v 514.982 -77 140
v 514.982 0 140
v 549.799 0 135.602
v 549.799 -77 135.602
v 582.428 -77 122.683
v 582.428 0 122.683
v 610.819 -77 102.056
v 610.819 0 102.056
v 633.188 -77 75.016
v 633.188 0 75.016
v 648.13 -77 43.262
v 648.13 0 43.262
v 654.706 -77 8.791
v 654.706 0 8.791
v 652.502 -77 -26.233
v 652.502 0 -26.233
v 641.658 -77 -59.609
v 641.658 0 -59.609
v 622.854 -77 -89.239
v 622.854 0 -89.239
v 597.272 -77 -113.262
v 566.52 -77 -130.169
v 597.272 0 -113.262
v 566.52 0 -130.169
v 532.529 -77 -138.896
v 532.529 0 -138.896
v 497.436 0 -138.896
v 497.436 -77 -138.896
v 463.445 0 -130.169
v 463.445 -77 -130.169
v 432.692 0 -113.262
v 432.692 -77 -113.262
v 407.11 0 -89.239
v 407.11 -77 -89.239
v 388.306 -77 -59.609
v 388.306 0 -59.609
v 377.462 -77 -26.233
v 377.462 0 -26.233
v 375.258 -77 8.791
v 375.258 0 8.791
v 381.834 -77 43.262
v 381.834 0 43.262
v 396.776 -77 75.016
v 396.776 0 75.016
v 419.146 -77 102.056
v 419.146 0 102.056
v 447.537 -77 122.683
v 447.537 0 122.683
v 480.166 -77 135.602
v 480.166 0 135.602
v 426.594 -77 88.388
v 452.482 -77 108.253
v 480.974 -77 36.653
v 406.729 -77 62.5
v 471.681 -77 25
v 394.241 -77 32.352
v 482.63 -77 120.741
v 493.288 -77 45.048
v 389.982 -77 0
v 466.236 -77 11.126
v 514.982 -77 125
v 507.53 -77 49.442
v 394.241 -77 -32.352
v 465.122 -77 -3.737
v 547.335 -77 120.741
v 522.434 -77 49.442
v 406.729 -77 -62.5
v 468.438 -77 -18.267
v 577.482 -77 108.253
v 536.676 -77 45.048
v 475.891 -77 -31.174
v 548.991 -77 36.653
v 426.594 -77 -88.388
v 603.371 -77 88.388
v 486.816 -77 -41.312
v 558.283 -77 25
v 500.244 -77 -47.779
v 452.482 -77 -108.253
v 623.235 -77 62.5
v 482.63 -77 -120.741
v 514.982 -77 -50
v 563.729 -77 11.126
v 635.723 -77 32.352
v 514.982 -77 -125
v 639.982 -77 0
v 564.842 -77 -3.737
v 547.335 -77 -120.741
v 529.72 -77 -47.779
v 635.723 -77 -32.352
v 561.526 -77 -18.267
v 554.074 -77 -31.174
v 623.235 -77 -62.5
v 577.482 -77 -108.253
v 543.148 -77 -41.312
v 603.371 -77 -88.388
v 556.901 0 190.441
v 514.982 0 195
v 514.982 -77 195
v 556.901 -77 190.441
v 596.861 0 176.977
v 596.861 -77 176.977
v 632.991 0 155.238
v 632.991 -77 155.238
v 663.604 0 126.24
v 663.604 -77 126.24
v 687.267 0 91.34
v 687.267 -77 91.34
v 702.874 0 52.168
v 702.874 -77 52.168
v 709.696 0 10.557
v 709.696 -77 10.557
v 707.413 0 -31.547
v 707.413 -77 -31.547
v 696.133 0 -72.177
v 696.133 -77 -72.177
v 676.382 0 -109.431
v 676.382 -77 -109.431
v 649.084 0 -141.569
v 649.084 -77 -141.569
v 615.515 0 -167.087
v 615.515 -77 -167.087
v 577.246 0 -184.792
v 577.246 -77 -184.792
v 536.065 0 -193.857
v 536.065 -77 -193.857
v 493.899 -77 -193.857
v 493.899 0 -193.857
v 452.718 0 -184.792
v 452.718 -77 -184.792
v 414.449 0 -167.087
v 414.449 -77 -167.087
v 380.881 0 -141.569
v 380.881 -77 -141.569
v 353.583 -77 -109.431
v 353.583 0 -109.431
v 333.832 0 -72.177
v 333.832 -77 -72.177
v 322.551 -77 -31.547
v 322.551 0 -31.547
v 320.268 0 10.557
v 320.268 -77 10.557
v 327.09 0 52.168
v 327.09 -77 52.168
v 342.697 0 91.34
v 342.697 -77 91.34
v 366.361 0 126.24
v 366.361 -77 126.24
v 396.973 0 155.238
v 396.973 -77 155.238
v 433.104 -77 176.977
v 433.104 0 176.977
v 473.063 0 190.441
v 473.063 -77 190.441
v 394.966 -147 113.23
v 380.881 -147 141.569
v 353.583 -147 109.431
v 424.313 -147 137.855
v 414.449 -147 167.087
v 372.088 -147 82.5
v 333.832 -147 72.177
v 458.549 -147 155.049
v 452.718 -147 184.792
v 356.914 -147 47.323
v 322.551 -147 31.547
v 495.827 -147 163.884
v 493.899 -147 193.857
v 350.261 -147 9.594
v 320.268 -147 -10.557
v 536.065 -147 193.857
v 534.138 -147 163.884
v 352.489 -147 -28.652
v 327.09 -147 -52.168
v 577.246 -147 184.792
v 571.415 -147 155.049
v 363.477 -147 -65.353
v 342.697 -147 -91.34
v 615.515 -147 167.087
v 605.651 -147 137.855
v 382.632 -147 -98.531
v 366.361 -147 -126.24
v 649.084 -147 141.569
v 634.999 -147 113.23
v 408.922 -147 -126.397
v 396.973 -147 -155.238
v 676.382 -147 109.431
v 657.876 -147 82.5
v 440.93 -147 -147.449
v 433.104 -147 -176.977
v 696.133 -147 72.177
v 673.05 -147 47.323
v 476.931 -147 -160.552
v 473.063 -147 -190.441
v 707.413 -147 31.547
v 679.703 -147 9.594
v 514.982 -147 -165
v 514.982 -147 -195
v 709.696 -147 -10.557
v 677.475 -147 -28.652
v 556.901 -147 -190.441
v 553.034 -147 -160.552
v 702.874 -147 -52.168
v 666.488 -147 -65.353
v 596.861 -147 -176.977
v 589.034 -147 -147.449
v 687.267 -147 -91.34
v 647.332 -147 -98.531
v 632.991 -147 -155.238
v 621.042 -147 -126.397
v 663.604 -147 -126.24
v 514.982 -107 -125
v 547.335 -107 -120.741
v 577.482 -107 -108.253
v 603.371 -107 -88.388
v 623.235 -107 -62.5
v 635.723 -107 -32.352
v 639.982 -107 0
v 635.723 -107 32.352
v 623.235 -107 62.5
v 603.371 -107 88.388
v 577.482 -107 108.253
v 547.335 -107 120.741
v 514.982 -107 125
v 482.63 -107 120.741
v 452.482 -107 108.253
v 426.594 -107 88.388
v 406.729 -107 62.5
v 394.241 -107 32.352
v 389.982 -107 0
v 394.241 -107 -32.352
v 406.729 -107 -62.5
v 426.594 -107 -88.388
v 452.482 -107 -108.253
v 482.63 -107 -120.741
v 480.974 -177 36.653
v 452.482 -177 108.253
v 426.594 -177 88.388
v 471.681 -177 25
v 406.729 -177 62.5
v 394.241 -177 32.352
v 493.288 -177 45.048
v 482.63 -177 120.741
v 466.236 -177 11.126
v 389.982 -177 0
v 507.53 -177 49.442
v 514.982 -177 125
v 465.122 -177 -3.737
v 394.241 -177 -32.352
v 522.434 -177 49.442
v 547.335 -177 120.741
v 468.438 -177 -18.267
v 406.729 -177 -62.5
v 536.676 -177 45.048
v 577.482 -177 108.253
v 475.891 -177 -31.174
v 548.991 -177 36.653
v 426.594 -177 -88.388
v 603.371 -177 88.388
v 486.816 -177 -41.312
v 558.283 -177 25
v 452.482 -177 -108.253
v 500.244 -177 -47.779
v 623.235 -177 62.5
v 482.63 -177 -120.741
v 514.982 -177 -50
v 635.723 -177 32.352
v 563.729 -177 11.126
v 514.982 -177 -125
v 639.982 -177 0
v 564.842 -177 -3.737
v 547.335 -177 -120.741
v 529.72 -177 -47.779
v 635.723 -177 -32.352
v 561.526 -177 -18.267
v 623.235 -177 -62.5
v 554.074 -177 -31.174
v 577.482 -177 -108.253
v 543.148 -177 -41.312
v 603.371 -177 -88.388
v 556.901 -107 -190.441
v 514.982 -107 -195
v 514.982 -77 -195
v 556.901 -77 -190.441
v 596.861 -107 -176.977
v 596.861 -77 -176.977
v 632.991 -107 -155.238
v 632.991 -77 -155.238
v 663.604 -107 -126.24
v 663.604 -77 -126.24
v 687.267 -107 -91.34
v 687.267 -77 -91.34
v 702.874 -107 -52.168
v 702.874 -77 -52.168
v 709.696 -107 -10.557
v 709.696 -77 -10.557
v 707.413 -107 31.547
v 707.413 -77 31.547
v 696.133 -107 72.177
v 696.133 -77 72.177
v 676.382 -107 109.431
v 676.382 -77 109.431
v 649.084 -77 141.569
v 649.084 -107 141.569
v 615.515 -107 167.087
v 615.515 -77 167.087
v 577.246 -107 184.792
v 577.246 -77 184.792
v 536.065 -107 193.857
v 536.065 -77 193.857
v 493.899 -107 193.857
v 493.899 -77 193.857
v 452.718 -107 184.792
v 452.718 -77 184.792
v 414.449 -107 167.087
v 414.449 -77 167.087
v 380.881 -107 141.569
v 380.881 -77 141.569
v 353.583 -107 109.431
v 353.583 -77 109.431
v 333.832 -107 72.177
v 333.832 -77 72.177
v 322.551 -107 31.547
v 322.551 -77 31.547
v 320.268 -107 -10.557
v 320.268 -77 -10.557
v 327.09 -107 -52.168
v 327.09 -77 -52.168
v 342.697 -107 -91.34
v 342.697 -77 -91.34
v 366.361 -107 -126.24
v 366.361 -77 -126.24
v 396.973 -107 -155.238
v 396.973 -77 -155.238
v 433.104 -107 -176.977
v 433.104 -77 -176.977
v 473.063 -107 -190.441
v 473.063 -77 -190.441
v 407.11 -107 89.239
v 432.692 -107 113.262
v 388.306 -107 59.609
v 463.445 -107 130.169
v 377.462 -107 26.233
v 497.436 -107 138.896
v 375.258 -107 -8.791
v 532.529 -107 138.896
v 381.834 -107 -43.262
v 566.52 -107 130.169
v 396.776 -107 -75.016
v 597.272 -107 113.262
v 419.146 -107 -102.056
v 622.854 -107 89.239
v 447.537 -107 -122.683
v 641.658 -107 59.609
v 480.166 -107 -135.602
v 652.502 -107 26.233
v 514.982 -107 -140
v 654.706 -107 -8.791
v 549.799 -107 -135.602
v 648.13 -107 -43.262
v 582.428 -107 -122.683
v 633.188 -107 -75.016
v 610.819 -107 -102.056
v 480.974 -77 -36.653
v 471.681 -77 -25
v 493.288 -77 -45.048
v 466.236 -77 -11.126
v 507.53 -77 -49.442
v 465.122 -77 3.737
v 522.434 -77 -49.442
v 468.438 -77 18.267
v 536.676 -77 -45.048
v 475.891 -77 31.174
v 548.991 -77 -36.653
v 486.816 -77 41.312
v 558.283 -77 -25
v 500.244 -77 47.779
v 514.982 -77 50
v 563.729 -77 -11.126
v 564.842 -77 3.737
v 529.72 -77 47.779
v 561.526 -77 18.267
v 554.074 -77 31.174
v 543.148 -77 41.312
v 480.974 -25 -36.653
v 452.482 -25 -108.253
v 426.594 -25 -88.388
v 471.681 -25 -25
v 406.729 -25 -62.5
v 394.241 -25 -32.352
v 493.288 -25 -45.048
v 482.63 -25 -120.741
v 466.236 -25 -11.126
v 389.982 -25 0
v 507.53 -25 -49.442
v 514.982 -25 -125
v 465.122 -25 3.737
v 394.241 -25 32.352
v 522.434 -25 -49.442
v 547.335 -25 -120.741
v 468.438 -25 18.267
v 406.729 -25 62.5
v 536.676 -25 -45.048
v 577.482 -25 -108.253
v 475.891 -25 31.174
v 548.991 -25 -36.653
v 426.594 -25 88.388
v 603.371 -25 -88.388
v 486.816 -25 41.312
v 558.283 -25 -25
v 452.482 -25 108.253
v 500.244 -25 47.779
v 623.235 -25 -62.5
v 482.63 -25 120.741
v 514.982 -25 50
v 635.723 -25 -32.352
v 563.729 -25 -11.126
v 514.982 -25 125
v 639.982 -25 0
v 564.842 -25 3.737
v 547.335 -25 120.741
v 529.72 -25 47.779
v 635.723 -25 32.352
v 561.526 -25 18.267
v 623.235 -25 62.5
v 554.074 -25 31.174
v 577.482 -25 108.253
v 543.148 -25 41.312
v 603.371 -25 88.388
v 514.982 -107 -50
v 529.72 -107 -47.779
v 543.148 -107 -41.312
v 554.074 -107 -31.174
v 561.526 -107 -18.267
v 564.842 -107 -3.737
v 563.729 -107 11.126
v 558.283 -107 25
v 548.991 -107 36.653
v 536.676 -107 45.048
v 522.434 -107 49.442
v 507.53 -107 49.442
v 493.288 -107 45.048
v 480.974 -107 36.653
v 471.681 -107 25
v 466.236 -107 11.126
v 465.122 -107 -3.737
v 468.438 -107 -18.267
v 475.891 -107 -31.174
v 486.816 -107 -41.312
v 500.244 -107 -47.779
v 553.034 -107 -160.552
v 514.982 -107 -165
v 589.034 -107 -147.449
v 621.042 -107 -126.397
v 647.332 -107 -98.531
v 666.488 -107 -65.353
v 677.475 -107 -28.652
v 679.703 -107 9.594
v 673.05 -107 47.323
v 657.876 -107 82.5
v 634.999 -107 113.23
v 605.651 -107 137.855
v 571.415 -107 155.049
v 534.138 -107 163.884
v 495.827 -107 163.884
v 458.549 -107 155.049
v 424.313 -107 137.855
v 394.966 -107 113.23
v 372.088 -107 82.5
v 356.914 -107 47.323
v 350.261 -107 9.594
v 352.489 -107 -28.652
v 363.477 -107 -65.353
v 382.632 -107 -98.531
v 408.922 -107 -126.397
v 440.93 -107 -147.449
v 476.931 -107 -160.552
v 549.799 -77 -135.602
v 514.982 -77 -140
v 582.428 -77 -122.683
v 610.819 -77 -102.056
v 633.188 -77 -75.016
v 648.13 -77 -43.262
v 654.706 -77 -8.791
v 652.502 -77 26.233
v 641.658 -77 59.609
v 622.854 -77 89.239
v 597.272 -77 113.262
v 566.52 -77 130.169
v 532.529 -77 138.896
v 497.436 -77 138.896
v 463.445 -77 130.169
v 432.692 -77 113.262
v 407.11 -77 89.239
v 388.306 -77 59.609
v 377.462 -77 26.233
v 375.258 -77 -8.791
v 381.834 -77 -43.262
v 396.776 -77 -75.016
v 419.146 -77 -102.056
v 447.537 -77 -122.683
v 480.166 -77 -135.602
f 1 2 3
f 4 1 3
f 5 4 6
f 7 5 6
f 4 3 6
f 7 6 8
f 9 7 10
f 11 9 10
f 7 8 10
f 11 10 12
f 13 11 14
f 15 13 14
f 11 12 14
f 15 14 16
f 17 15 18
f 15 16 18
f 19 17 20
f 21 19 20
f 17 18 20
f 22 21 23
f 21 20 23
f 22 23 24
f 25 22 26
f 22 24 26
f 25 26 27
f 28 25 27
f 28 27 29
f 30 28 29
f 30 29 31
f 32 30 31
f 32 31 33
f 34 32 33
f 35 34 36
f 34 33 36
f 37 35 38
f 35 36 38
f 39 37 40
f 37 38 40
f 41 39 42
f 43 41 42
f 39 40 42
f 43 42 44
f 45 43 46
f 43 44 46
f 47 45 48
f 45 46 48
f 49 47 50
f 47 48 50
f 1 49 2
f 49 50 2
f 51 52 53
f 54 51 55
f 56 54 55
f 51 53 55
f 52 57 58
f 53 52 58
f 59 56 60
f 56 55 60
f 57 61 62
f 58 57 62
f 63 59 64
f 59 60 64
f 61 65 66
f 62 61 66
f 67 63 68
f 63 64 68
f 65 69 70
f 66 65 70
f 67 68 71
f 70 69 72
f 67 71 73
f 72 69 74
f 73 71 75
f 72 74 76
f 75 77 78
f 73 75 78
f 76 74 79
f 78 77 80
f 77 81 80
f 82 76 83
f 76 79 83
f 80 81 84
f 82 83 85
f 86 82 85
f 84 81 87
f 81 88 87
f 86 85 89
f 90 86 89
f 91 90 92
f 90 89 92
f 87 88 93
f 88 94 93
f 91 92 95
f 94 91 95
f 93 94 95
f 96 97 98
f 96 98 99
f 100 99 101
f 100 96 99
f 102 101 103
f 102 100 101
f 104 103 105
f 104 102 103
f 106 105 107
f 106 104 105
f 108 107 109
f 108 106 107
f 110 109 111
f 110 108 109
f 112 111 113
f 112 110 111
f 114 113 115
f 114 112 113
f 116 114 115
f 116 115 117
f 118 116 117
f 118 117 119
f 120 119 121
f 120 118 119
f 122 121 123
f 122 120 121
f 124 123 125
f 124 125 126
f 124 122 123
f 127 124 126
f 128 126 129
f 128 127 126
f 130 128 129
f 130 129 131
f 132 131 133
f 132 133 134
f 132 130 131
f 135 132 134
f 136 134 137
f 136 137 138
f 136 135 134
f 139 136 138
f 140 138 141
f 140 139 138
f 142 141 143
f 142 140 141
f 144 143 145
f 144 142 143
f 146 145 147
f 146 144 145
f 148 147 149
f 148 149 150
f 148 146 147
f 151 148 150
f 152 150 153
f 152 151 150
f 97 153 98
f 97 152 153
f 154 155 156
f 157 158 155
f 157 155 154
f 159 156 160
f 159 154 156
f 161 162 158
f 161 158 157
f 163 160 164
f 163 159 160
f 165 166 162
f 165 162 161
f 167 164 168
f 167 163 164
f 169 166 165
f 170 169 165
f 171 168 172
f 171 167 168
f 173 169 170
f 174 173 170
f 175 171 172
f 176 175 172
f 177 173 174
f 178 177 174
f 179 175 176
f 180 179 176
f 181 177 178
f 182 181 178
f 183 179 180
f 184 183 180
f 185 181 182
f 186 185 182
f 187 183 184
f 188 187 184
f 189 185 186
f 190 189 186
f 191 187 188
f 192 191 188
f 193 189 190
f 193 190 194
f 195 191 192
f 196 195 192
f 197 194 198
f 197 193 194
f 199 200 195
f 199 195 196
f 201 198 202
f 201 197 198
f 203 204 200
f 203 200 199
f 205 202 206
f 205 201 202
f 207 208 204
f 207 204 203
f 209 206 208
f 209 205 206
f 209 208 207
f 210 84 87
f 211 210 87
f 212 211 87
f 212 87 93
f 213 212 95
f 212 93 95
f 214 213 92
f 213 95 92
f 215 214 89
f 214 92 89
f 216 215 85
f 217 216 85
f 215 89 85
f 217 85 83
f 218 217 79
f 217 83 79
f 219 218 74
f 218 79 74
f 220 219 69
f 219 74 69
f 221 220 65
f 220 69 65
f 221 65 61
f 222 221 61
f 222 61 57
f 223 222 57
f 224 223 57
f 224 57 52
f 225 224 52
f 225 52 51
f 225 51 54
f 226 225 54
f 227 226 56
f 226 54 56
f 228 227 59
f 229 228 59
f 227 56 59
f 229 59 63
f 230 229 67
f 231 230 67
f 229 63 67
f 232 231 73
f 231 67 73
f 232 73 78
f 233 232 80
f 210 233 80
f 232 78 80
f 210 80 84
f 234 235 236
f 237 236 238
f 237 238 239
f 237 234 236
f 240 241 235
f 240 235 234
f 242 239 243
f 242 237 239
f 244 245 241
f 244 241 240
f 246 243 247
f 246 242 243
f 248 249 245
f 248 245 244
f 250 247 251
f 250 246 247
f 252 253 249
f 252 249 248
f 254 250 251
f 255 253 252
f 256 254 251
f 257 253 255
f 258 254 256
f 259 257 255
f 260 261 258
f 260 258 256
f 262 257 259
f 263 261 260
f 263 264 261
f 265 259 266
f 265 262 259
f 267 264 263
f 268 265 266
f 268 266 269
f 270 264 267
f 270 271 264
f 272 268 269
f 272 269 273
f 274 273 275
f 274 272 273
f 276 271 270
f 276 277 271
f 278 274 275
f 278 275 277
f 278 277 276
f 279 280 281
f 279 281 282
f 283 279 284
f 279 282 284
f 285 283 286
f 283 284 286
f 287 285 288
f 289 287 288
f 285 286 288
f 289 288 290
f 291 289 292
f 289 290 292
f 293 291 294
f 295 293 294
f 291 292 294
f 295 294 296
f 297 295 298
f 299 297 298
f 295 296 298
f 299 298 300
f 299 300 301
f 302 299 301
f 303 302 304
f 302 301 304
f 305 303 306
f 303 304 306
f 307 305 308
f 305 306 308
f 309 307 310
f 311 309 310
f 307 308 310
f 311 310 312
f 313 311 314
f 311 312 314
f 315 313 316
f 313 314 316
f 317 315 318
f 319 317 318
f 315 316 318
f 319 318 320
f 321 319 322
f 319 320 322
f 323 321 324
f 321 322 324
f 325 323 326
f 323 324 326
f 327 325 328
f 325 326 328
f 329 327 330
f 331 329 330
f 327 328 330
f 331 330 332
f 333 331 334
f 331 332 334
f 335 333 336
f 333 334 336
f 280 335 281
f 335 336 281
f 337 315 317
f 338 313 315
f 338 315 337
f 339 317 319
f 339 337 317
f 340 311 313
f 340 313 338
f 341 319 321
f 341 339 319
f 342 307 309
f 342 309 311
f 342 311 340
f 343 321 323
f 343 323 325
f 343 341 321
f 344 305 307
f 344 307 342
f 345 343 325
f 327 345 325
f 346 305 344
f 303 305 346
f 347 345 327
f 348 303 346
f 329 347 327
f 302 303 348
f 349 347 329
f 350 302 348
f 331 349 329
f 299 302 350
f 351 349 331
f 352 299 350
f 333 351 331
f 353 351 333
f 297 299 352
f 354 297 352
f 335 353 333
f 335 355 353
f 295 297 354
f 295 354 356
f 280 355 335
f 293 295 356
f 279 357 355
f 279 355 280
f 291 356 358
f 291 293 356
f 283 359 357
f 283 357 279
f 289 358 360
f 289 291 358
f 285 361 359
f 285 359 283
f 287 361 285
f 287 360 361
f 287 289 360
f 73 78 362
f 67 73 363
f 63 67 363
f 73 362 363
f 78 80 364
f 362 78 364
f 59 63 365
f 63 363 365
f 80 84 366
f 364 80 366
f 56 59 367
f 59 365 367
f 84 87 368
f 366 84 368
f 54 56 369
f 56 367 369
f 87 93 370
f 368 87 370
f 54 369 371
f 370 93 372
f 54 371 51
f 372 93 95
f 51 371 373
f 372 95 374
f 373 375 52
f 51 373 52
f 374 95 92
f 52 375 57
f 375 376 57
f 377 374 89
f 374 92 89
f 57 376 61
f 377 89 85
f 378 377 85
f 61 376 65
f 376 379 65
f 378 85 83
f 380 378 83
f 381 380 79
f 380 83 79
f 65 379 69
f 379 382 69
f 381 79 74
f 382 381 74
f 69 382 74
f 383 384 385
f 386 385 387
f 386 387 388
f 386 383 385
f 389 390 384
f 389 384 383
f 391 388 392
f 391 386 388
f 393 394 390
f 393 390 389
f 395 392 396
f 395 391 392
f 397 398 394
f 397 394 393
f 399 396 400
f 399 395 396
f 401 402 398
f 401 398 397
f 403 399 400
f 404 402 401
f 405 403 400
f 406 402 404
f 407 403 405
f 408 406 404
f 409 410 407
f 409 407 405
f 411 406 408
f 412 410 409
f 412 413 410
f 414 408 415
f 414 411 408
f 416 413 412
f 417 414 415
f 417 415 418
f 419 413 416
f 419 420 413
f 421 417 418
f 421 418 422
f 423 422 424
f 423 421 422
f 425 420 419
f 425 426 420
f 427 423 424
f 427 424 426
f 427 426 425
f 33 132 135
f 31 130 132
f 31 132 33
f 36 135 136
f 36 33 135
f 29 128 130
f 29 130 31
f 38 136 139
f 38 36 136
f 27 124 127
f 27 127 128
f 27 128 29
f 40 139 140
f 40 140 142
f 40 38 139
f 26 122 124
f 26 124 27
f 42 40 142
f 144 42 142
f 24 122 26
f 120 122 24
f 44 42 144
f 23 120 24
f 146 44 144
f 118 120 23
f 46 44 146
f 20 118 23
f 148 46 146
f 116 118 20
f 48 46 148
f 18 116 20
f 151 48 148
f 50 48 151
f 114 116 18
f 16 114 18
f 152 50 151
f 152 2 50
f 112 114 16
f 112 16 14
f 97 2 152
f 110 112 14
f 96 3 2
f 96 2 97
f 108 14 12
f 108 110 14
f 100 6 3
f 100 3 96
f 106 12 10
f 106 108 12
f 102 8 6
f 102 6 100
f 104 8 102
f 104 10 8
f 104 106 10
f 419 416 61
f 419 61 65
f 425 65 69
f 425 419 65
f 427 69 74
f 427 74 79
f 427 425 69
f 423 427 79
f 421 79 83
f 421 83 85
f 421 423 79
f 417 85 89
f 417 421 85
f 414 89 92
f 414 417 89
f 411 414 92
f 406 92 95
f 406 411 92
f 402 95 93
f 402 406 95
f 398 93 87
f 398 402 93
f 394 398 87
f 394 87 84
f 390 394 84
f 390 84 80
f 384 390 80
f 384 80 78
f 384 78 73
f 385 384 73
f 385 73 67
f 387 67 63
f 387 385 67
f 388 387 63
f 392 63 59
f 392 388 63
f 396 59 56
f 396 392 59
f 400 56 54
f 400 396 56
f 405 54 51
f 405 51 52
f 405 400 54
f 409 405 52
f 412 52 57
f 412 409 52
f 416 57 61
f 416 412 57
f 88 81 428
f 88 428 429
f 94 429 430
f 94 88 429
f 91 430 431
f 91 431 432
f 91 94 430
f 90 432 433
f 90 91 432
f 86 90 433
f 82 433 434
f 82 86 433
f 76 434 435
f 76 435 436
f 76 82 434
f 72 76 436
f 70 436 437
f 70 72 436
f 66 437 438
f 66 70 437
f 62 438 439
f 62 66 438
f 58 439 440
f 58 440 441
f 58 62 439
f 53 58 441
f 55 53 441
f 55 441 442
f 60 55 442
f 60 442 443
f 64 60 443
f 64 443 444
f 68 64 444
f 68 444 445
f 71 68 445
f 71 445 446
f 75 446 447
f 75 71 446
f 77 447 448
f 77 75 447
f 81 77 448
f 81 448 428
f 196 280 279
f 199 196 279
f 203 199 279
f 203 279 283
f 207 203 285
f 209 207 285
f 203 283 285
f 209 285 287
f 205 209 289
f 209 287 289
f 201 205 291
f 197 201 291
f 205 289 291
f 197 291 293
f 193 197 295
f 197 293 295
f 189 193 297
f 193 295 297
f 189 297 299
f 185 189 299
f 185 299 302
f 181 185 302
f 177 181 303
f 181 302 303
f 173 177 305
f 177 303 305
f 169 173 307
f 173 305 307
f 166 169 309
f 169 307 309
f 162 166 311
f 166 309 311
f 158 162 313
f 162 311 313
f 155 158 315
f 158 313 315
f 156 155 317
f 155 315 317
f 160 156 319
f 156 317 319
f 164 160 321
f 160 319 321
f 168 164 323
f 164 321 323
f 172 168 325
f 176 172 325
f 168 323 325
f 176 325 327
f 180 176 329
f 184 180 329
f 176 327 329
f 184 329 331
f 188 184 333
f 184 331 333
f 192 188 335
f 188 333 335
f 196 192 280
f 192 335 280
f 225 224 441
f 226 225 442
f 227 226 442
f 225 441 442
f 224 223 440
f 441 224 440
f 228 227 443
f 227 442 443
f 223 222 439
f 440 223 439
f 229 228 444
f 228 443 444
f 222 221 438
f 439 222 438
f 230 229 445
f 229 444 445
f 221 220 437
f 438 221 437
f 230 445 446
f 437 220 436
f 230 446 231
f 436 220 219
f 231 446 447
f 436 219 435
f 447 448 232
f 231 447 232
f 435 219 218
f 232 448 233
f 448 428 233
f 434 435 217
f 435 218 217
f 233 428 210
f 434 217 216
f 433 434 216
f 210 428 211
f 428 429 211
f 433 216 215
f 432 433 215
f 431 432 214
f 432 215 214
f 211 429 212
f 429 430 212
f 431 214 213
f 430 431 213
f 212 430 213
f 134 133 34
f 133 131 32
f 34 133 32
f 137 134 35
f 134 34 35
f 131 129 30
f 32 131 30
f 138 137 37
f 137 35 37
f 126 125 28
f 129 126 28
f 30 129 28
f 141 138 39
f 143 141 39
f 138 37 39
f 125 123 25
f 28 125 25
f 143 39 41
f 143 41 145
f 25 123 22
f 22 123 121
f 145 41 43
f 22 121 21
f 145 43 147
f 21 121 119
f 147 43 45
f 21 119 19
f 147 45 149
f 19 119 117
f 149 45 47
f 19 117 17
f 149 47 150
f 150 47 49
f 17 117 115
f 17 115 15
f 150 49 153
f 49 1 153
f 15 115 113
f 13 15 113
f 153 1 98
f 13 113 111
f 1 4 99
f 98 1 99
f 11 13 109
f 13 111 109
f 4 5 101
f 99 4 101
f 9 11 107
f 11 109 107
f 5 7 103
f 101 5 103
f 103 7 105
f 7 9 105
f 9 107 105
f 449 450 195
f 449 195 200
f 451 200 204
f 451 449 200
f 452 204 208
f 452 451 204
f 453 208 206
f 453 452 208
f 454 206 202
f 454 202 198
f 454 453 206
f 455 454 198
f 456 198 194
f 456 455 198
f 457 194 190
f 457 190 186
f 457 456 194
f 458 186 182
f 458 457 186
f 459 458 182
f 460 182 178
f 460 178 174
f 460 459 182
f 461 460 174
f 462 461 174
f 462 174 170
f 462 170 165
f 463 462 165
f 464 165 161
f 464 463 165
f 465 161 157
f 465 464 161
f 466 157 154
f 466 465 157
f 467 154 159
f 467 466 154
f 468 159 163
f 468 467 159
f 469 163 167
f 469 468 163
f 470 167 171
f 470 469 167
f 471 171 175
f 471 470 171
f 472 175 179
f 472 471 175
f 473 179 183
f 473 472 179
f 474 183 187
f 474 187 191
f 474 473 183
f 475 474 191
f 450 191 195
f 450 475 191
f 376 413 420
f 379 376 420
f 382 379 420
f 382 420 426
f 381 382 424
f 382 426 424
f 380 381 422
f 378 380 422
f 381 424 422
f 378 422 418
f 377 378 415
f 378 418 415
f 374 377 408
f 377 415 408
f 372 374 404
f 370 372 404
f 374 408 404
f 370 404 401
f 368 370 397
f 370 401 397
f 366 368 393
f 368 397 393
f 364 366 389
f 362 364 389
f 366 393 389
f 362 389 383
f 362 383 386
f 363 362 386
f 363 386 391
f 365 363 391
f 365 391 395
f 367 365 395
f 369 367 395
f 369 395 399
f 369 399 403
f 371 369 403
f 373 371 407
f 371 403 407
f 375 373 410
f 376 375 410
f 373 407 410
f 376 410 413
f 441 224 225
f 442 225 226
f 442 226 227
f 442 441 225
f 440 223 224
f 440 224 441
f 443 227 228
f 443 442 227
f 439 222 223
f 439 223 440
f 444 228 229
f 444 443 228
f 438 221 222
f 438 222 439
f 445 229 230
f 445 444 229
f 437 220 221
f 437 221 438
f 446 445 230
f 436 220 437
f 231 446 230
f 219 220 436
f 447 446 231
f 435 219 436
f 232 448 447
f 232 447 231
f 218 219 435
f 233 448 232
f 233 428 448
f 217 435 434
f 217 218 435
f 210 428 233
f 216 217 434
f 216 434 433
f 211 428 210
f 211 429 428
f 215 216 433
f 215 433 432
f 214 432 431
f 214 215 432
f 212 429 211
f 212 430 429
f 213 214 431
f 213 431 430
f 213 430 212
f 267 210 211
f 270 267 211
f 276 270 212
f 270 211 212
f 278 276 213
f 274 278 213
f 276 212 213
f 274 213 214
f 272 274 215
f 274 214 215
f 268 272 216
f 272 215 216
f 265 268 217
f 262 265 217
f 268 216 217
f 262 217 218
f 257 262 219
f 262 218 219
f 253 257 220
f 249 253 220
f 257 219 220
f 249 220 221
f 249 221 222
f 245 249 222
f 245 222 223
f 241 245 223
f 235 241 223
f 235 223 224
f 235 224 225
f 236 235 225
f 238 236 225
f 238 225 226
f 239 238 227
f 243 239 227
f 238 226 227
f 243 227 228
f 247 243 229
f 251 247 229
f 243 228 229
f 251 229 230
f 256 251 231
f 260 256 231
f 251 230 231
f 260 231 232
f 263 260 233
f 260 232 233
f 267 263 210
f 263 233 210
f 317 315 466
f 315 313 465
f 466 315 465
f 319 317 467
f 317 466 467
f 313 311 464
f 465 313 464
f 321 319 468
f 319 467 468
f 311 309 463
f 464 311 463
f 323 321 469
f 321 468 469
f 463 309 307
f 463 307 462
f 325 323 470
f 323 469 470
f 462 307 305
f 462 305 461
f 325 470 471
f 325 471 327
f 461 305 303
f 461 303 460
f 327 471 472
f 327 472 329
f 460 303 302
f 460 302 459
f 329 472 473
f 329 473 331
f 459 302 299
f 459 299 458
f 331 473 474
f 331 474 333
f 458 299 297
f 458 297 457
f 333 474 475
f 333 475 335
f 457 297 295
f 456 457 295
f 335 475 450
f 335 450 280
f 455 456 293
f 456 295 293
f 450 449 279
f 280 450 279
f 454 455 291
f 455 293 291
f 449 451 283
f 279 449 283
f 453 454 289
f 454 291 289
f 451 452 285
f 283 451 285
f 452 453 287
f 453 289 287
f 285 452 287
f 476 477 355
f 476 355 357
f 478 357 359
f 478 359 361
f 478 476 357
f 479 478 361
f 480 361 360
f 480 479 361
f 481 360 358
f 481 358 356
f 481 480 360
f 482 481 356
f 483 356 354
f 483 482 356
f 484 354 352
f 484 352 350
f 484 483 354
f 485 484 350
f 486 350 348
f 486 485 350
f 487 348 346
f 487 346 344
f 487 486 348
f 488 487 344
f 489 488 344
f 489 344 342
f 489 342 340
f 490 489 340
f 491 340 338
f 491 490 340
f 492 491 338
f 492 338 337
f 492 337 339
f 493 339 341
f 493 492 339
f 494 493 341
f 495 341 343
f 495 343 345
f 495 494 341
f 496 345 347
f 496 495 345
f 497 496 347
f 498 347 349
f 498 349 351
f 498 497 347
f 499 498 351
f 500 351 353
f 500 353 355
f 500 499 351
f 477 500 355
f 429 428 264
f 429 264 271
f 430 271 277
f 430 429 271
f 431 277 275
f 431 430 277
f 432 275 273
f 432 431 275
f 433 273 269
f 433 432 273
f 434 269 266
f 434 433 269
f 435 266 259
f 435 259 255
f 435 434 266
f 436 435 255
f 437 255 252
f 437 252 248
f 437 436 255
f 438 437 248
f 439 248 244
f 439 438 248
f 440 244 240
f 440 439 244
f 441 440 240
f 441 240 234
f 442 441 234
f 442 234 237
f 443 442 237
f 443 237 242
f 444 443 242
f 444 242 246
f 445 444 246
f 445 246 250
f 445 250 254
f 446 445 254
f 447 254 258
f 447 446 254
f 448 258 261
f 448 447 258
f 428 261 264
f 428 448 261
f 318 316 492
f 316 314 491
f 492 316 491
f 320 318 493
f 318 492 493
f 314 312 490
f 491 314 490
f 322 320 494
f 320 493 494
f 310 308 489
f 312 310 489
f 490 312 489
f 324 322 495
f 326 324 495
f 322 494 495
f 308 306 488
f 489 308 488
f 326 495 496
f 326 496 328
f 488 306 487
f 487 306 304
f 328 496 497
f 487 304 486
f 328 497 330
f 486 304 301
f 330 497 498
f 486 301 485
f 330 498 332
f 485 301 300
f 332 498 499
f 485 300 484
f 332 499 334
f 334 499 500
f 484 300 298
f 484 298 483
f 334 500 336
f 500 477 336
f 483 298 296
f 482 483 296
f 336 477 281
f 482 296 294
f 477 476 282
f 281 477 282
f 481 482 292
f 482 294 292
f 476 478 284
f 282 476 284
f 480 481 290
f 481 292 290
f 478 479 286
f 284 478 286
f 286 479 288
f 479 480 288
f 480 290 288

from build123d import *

# Parameters (mm, degrees)
SKETCH_8_R       = 195
SKETCH_8_R_2     = 140
EXTRUDE_1_DEPTH  = 77
SKETCH_10_R      = 195
SKETCH_10_R_2    = 140
EXTRUDE_2_DEPTH  = 30
SKETCH_11_R      = 195
SKETCH_11_R_2    = 165
EXTRUDE_3_DEPTH  = 40
SKETCH_12_R      = 125
SKETCH_12_R_2    = 50
EXTRUDE_4_DEPTH  = 52
SKETCH_17_R      = 125
SKETCH_17_R_2    = 50
EXTRUDE_9_DEPTH  = 30
SKETCH_18_R      = 125
SKETCH_18_R_2    = 50
EXTRUDE_10_DEPTH = 70


with BuildPart() as part:
    # 草图8 → 凸台-拉伸1 (new body)
    with BuildSketch(Plane(origin=(0, 0, 0), x_dir=(1, 0, 0), z_dir=(0, 1, 0))):
        with Locations(Location((514.982170762, 0, 0), (0, 0, 270))):
            Circle(SKETCH_8_R)
        with Locations(Location((514.982170762, 0, 0), (0, 0, 270))):
            Circle(SKETCH_8_R_2, mode=Mode.SUBTRACT)
    extrude(amount=-EXTRUDE_1_DEPTH)


with BuildPart() as body_2:
    # 草图10 → 凸台-拉伸2 (new body)
    with BuildSketch(Plane(origin=(0, -77, 0), x_dir=(-1, 0, 0), z_dir=(0, -1, 0))):
        with Locations(Location((-514.982170762, 0, 0), (0, 0, 90))):
            Circle(SKETCH_10_R)
        with Locations(Location((-514.982170762, 0, 0), (0, 0, 90))):
            Circle(SKETCH_10_R_2, mode=Mode.SUBTRACT)
    extrude(amount=EXTRUDE_2_DEPTH)


with BuildPart() as body_3:
    # 草图11 → 凸台-拉伸3 (new body)
    with BuildSketch(Plane(origin=(0, -107, 0), x_dir=(-1, 0, 0), z_dir=(0, -1, 0))):
        with Locations(Location((-514.982170762, 0, 0), (0, 0, 90))):
            Circle(SKETCH_11_R)
        with Locations(Location((-514.982170762, 0, 0), (0, 0, 90))):
            Circle(SKETCH_11_R_2, mode=Mode.SUBTRACT)
    extrude(amount=EXTRUDE_3_DEPTH)


with BuildPart() as body_4:
    # 草图12 → 凸台-拉伸4 (new body)
    with BuildSketch(Plane(origin=(0, -25, 0), x_dir=(1, 0, 0), z_dir=(0, 1, 0))):
        with Locations(Location((514.982170762, 0, 0), (0, 0, 270))):
            Circle(SKETCH_12_R)
        with Locations(Location((514.982170762, 0, 0), (0, 0, 270))):
            Circle(SKETCH_12_R_2, mode=Mode.SUBTRACT)
    extrude(amount=-EXTRUDE_4_DEPTH)


with BuildPart() as body_5:
    # 草图17 → 凸台-拉伸9 (new body)
    with BuildSketch(Plane(origin=(0, -77, 0), x_dir=(-1, 0, 0), z_dir=(0, -1, 0))):
        with Locations(Location((-514.982170762, 0, 0), (0, 0, 90))):
            Circle(SKETCH_17_R)
        with Locations(Location((-514.982170762, 0, 0), (0, 0, 90))):
            Circle(SKETCH_17_R_2, mode=Mode.SUBTRACT)
    extrude(amount=EXTRUDE_9_DEPTH)


with BuildPart() as body_6:
    # 草图18 → 凸台-拉伸10 (new body)
    with BuildSketch(Plane(origin=(0, -107, 0), x_dir=(-1, 0, 0), z_dir=(0, -1, 0))):
        with Locations(Location((-514.982170762, 0, 0), (0, 0, 90))):
            Circle(SKETCH_18_R)
        with Locations(Location((-514.982170762, 0, 0), (0, 0, 90))):
            Circle(SKETCH_18_R_2, mode=Mode.SUBTRACT)
    extrude(amount=EXTRUDE_10_DEPTH)


solid = Compound([part.part, body_2.part, body_3.part, body_4.part, body_5.part, body_6.part])
